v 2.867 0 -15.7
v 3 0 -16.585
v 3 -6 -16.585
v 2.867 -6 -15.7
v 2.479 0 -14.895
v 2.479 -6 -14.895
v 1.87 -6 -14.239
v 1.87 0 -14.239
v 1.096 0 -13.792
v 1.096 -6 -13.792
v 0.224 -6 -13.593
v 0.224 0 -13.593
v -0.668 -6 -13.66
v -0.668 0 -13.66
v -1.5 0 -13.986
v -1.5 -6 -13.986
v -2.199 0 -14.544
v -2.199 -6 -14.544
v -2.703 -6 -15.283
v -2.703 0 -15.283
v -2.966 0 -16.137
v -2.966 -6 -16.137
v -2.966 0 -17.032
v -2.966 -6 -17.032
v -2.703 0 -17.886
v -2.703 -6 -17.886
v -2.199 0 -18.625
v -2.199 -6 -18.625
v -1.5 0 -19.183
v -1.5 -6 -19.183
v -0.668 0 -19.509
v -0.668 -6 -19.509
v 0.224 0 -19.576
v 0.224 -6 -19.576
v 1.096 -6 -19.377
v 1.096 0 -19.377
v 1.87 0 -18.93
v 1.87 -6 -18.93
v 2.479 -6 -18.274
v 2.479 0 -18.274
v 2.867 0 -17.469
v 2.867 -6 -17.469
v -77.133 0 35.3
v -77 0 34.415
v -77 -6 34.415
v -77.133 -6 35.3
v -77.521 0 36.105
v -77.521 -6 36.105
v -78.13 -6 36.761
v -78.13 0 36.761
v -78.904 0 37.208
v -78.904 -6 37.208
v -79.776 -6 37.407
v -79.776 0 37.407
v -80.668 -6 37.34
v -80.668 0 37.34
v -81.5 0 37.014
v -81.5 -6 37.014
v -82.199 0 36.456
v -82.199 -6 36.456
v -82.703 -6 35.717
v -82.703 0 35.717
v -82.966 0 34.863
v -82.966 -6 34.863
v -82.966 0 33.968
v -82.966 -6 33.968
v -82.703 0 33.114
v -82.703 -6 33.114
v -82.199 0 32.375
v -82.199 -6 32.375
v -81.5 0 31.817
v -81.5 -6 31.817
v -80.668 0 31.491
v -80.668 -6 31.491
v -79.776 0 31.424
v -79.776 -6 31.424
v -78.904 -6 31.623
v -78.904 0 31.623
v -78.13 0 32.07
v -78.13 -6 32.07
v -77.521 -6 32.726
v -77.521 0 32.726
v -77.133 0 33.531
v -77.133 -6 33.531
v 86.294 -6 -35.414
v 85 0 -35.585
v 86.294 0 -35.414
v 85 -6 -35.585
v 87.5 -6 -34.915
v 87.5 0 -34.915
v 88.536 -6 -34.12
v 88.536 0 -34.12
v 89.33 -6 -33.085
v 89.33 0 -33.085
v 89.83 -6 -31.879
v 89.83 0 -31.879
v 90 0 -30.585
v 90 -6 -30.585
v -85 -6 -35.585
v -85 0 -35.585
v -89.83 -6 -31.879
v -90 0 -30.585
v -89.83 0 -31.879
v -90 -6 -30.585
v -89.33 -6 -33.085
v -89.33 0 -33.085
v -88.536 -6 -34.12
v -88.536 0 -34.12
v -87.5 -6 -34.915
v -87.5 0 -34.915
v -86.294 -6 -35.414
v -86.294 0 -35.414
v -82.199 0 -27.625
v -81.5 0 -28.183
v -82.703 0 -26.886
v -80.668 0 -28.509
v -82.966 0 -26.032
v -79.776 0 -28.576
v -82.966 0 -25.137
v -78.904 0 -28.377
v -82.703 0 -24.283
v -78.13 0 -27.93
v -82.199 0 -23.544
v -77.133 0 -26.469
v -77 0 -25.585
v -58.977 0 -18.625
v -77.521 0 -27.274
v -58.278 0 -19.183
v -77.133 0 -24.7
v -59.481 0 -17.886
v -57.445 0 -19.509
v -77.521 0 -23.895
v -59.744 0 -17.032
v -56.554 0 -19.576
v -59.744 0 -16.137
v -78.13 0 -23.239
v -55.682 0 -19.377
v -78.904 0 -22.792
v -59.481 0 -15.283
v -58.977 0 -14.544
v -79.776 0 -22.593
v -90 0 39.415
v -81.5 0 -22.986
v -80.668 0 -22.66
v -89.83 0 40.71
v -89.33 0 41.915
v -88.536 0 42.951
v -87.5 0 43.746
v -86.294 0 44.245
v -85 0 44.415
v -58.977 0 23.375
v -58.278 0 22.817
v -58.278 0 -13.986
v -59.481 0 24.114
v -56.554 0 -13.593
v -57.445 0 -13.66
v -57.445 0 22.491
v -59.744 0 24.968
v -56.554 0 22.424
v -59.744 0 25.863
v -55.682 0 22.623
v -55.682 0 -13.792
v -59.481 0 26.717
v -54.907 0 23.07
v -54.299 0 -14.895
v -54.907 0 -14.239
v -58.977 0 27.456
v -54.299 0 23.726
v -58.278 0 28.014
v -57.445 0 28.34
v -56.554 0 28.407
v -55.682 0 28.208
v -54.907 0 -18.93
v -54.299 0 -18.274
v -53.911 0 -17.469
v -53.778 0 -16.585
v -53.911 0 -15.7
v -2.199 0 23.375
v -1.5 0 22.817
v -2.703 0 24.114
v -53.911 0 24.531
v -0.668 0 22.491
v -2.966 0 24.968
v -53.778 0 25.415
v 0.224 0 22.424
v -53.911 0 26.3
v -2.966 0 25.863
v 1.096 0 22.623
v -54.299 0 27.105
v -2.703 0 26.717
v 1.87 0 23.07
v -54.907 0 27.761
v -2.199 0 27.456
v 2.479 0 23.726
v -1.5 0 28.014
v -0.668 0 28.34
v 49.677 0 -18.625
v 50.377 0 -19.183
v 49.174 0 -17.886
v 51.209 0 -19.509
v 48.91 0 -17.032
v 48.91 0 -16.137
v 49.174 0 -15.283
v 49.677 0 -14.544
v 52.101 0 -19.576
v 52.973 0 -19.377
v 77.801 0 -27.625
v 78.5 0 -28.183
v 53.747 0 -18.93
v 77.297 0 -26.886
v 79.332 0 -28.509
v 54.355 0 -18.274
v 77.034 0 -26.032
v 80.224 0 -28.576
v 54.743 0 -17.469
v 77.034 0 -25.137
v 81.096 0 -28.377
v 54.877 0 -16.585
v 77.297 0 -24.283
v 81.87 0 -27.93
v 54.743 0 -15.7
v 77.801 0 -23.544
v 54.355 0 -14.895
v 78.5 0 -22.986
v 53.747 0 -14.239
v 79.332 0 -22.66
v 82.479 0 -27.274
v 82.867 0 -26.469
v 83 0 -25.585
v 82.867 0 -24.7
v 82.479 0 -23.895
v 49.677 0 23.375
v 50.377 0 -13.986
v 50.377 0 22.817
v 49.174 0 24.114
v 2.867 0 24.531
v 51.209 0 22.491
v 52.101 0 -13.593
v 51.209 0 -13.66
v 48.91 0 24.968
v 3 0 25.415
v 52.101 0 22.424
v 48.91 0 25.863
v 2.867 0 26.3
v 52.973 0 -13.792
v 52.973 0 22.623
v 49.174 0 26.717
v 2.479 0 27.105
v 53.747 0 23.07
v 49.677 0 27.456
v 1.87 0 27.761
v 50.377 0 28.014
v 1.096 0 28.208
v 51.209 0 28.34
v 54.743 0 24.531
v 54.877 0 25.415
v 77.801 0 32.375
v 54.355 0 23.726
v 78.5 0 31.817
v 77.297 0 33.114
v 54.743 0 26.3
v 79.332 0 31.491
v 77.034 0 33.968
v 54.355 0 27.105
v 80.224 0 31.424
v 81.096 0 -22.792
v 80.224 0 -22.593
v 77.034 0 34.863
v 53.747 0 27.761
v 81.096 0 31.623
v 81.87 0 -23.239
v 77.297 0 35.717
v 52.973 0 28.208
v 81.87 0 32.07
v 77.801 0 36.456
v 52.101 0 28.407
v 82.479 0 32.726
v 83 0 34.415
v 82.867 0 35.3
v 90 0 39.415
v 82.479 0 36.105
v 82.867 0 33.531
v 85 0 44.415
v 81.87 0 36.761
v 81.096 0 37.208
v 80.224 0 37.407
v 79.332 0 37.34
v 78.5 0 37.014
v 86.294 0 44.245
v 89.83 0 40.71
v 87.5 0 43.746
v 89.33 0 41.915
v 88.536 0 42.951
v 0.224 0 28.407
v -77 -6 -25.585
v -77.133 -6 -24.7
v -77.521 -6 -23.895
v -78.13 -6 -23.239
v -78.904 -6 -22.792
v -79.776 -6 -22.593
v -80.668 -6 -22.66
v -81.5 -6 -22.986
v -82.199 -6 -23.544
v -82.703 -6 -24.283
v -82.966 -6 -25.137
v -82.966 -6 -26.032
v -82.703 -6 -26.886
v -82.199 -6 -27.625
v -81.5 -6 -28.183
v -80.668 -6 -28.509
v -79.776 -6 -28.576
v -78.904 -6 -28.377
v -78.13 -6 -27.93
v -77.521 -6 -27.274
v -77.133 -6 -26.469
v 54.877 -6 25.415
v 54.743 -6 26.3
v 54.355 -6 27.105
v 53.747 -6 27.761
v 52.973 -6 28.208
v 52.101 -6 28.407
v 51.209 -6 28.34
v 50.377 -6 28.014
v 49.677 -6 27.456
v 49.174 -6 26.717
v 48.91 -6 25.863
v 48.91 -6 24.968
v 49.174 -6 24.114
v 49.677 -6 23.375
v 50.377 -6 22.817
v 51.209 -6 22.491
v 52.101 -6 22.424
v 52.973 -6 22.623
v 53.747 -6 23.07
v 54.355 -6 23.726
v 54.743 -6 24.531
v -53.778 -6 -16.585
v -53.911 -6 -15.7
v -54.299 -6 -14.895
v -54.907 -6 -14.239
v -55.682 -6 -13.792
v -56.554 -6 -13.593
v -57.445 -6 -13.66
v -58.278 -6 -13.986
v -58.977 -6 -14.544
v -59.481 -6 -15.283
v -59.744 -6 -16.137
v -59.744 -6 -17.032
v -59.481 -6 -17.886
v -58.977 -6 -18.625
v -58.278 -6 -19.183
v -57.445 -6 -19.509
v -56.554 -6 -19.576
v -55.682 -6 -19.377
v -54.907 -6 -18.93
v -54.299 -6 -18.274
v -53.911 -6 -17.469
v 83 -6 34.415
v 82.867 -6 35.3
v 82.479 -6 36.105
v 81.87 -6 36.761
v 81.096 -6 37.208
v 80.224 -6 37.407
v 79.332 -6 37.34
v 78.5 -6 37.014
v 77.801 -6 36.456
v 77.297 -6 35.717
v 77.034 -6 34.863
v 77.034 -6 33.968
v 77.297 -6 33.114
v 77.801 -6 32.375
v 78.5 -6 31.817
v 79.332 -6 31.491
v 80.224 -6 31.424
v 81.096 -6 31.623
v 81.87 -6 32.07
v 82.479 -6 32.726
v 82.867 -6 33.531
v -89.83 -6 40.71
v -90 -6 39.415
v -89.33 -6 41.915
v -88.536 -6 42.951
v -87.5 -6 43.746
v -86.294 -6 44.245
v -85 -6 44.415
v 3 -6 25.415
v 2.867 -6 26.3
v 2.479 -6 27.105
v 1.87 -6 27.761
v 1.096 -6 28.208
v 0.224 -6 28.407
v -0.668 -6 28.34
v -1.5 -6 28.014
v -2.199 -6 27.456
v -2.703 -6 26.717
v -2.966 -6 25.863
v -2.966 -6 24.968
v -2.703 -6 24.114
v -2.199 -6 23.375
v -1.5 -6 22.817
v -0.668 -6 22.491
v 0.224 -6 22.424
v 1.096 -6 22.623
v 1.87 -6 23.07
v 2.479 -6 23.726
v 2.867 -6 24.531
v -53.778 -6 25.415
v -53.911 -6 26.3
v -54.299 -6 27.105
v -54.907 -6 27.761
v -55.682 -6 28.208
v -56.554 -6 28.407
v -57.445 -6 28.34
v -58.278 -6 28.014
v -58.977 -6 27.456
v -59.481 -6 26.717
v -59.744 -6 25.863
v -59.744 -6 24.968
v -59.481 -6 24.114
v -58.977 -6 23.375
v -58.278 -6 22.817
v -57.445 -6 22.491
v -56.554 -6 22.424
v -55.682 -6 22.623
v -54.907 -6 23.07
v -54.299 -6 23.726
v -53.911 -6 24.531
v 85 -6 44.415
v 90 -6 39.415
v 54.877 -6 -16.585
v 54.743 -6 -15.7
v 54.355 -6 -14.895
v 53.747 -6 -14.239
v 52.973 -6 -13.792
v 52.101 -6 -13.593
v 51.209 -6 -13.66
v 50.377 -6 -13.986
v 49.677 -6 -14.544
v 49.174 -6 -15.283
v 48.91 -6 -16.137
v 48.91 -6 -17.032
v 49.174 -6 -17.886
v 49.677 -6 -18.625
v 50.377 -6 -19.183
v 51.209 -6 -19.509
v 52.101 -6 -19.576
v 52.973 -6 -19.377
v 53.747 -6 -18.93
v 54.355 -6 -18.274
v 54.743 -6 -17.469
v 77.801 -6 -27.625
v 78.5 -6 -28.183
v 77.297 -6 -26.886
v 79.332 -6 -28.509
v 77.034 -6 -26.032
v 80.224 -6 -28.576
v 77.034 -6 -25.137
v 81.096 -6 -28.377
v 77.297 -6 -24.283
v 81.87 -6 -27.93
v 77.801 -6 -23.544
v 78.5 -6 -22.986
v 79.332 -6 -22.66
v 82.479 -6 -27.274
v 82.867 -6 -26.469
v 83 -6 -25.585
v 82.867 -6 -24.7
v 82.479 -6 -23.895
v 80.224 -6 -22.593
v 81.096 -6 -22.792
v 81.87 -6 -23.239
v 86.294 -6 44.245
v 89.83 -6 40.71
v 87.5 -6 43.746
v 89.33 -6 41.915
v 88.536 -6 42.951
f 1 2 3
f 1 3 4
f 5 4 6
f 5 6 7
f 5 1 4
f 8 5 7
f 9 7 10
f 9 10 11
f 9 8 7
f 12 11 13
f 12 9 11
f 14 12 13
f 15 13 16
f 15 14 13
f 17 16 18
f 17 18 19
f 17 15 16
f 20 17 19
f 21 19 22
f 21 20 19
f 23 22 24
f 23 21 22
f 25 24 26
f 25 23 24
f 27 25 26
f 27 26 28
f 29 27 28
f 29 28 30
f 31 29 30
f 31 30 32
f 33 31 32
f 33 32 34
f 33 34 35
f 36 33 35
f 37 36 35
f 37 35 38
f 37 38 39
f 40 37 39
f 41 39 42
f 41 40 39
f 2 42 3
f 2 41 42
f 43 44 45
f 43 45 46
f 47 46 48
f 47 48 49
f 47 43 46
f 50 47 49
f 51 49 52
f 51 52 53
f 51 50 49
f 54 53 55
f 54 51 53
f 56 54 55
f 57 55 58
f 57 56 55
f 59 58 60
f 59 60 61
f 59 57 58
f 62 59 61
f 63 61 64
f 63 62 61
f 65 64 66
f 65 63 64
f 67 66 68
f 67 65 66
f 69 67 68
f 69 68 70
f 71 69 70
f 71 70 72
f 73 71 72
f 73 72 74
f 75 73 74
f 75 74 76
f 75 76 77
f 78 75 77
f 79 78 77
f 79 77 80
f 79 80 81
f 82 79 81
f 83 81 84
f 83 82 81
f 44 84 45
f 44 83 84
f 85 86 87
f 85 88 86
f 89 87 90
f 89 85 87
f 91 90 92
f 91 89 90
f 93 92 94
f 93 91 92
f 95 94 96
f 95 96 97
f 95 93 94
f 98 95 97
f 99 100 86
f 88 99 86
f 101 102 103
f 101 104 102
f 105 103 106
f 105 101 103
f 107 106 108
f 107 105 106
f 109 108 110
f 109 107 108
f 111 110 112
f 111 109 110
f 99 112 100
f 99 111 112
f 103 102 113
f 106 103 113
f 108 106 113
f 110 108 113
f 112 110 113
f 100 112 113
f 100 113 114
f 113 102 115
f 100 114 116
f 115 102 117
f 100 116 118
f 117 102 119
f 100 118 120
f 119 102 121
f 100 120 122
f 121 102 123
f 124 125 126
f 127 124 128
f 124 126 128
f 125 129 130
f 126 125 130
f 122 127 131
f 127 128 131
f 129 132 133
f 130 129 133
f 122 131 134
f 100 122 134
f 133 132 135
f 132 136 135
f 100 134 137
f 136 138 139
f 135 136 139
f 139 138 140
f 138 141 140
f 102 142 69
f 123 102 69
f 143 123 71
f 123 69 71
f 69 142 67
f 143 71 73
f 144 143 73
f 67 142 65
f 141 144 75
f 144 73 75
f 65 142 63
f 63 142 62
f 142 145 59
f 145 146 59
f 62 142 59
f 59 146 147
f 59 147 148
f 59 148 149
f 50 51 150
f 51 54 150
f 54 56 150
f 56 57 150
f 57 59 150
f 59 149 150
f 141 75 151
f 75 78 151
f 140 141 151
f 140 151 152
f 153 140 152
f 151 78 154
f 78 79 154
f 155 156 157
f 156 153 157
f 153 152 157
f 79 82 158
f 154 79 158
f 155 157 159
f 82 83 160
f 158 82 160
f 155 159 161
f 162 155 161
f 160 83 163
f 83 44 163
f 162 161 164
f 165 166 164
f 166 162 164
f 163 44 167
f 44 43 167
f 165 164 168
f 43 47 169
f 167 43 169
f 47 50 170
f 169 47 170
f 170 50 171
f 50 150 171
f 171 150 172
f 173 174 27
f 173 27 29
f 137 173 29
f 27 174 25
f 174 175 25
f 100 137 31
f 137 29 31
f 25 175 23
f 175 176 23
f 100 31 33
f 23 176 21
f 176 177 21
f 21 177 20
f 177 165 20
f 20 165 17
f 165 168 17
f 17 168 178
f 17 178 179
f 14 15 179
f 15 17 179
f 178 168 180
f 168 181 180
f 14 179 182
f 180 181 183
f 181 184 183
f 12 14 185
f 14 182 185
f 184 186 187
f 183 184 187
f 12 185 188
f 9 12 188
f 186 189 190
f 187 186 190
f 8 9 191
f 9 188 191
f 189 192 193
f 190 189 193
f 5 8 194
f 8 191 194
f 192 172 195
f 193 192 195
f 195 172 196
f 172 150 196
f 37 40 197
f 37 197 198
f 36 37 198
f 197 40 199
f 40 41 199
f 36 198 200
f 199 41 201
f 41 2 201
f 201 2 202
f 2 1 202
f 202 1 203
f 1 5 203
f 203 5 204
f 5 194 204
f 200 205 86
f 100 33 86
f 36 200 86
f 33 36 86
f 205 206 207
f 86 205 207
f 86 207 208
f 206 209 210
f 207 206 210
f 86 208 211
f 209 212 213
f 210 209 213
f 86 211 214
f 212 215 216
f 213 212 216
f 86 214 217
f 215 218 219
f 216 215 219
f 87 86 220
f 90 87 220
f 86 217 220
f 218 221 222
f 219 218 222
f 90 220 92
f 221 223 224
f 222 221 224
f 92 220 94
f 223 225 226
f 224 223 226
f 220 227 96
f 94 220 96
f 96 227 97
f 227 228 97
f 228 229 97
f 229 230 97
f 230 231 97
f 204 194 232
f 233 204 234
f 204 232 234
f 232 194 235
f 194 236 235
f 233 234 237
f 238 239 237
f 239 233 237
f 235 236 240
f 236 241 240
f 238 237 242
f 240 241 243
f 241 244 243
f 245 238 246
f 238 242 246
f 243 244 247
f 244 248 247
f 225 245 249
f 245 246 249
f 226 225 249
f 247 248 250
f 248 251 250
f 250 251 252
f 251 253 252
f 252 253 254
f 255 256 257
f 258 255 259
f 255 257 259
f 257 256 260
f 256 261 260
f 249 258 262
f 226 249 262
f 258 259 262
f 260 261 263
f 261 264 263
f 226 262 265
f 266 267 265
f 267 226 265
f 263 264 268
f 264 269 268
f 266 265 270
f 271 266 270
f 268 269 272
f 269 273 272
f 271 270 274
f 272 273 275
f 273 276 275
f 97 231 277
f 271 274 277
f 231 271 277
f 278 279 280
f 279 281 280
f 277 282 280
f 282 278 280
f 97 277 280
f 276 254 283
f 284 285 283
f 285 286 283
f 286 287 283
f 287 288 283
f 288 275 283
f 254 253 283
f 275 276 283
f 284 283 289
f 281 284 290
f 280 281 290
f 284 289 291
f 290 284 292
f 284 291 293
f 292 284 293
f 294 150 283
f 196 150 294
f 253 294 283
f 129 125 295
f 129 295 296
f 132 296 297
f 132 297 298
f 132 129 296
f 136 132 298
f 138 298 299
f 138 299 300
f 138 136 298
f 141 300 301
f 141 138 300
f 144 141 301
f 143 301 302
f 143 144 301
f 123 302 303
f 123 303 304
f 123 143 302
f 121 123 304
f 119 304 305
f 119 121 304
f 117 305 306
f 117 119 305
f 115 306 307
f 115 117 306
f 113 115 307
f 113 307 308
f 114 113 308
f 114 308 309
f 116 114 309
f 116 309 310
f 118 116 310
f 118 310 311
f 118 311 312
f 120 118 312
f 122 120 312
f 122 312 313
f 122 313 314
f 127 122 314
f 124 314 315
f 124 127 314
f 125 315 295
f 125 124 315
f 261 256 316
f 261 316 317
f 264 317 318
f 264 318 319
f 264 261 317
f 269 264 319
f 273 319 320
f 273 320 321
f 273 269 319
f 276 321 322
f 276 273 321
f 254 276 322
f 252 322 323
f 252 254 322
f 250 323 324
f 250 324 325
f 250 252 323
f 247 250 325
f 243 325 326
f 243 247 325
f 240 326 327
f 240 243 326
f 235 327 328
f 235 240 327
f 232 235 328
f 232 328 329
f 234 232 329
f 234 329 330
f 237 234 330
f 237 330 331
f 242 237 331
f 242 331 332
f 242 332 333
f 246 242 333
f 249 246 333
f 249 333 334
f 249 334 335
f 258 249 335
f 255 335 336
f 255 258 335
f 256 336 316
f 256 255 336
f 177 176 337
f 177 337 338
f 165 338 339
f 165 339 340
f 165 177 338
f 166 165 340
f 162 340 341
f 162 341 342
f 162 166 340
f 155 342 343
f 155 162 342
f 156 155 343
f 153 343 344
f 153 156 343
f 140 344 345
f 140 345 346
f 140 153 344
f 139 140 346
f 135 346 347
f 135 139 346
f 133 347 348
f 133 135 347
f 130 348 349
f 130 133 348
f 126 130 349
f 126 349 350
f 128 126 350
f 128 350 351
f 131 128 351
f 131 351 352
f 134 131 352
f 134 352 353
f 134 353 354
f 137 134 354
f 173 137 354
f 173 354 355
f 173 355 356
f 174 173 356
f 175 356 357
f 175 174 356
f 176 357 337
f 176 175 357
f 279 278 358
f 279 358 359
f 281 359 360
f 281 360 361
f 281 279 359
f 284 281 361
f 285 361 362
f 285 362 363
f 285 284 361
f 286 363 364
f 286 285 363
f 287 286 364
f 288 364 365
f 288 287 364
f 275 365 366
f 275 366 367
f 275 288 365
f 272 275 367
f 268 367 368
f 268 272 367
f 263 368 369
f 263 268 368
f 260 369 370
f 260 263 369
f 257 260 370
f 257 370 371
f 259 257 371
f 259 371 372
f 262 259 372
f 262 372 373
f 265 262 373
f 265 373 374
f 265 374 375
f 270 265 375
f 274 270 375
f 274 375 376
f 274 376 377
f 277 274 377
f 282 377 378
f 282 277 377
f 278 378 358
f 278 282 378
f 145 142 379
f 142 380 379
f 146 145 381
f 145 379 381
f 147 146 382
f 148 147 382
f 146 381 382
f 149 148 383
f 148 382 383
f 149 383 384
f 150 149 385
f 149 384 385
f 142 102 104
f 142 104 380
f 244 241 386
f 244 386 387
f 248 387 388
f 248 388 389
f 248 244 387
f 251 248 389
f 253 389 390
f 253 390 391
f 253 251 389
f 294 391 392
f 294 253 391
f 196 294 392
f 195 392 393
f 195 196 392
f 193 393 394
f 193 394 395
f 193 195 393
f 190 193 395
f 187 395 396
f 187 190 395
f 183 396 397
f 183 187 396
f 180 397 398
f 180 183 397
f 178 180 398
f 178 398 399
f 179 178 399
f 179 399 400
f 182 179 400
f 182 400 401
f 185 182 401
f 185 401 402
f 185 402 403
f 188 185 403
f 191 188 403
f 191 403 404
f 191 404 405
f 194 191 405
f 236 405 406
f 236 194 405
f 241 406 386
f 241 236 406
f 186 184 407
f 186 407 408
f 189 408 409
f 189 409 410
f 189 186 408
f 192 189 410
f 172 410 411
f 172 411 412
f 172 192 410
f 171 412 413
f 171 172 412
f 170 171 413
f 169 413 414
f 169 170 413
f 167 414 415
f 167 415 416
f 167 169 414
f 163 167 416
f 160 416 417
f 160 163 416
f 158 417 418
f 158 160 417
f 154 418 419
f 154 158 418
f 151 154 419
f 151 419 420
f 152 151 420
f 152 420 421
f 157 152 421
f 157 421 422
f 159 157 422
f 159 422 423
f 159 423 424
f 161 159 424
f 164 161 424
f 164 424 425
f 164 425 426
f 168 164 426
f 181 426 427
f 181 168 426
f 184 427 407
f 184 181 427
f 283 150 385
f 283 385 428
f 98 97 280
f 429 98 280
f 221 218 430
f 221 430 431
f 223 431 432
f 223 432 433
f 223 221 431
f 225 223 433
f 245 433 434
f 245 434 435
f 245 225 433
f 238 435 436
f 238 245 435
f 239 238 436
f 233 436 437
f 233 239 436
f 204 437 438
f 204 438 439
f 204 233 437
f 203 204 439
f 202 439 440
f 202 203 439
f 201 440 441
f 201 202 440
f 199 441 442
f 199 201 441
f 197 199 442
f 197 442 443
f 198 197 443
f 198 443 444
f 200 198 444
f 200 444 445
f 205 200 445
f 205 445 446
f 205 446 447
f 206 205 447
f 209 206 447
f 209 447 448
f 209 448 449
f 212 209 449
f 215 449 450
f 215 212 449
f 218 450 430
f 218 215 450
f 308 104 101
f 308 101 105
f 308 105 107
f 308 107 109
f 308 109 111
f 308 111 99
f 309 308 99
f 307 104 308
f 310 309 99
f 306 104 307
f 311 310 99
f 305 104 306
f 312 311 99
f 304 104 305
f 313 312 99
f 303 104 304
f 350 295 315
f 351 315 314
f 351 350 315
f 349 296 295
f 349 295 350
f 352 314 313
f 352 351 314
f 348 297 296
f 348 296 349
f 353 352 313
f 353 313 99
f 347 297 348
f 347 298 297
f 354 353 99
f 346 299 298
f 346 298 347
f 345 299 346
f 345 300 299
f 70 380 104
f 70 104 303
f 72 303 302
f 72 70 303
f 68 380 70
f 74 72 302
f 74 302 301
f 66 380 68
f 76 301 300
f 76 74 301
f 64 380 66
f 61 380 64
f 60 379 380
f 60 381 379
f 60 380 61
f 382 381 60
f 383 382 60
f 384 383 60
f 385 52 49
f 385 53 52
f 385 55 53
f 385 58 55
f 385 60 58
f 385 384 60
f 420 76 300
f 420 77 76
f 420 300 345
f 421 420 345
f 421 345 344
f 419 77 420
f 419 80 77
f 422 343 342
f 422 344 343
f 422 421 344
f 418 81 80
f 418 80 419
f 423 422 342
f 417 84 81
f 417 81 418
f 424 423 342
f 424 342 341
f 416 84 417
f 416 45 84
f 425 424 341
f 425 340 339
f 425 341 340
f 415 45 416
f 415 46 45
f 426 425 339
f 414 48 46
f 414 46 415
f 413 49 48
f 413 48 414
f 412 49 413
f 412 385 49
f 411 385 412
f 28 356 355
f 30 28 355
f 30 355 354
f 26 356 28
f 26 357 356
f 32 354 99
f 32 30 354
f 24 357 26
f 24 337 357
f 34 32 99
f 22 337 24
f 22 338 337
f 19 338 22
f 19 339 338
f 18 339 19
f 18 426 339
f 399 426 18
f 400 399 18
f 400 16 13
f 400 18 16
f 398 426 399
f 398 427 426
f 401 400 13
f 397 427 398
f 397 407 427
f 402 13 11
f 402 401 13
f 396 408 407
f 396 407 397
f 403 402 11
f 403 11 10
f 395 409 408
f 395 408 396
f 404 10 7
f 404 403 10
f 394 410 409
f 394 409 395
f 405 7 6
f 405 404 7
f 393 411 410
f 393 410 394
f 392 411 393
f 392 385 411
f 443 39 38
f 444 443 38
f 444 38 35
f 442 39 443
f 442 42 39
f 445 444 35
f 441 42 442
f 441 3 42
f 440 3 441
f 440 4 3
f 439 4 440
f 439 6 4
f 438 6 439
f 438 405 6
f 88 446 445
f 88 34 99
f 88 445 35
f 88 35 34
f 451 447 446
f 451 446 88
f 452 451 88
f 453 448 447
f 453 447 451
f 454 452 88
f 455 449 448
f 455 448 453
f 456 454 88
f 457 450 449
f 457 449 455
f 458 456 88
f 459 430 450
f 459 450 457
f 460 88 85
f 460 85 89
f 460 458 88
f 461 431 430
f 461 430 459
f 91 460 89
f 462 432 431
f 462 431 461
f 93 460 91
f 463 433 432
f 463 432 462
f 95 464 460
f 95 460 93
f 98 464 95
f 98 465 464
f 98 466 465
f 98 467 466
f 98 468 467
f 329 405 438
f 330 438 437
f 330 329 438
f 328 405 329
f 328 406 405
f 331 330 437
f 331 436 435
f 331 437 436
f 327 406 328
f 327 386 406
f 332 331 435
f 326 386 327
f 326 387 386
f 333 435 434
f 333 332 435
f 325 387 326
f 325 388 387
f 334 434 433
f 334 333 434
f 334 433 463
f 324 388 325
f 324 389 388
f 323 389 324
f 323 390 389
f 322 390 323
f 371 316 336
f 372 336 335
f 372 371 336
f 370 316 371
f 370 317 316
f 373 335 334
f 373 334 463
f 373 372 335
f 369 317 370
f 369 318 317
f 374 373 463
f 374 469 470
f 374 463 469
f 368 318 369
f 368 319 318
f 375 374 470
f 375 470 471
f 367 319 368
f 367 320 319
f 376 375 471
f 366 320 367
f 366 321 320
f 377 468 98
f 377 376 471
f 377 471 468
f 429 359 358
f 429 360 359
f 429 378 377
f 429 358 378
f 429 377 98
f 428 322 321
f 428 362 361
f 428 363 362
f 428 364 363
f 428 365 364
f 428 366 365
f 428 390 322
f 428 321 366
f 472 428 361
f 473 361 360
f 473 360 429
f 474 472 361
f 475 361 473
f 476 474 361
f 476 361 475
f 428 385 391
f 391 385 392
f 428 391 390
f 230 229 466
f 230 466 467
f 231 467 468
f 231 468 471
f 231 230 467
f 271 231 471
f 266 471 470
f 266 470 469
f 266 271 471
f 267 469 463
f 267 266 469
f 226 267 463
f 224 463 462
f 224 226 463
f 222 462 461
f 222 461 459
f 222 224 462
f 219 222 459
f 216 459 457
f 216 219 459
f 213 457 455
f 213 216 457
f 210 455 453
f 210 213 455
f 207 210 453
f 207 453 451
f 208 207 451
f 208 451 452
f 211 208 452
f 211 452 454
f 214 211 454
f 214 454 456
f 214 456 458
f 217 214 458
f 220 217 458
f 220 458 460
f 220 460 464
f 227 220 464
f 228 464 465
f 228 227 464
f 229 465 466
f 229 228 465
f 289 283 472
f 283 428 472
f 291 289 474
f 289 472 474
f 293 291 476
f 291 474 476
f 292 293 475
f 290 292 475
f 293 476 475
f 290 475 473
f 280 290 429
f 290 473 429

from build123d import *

# Parameters (mm, degrees)
F0_W     = 180
F0_H     = 80
F0_R     = 3
F1_DEPTH = 6
F2_R     = 5


with BuildPart() as f1:
    # F0 (on Front) → F1 (new body)
    with BuildSketch(Plane.XZ):
        with Locations((0, 4.415482)):
            Rectangle(F0_W, F0_H)
        with Locations((-80, -25.584518)):
            Circle(F0_R, mode=Mode.SUBTRACT)
        with Locations((-56.777846, -16.584518)):
            Circle(F0_R, mode=Mode.SUBTRACT)
        with Locations((0, -16.584518)):
            Circle(F0_R, mode=Mode.SUBTRACT)
        with Locations((51.876541, -16.584518)):
            Circle(F0_R, mode=Mode.SUBTRACT)
        with Locations((80, -25.584518)):
            Circle(F0_R, mode=Mode.SUBTRACT)
        with Locations((-80, 34.415482)):
            Circle(F0_R, mode=Mode.SUBTRACT)
        with Locations((-56.777846, 25.415482)):
            Circle(F0_R, mode=Mode.SUBTRACT)
        with Locations((0, 25.415482)):
            Circle(F0_R, mode=Mode.SUBTRACT)
        with Locations((51.876541, 25.415482)):
            Circle(F0_R, mode=Mode.SUBTRACT)
        with Locations((80, 34.415482)):
            Circle(F0_R, mode=Mode.SUBTRACT)
    extrude(amount=F1_DEPTH)

    # F2
    f2_edges = [f1.edges().sort_by_distance(p)[0] for p in [
        (-90, -3, 44.415482),
        (-90, -3, -35.584518),
        (90, -3, 44.415482),
        (90, -3, -35.584518),
    ]]
    fillet(f2_edges, radius=F2_R)


solid = f1.part
